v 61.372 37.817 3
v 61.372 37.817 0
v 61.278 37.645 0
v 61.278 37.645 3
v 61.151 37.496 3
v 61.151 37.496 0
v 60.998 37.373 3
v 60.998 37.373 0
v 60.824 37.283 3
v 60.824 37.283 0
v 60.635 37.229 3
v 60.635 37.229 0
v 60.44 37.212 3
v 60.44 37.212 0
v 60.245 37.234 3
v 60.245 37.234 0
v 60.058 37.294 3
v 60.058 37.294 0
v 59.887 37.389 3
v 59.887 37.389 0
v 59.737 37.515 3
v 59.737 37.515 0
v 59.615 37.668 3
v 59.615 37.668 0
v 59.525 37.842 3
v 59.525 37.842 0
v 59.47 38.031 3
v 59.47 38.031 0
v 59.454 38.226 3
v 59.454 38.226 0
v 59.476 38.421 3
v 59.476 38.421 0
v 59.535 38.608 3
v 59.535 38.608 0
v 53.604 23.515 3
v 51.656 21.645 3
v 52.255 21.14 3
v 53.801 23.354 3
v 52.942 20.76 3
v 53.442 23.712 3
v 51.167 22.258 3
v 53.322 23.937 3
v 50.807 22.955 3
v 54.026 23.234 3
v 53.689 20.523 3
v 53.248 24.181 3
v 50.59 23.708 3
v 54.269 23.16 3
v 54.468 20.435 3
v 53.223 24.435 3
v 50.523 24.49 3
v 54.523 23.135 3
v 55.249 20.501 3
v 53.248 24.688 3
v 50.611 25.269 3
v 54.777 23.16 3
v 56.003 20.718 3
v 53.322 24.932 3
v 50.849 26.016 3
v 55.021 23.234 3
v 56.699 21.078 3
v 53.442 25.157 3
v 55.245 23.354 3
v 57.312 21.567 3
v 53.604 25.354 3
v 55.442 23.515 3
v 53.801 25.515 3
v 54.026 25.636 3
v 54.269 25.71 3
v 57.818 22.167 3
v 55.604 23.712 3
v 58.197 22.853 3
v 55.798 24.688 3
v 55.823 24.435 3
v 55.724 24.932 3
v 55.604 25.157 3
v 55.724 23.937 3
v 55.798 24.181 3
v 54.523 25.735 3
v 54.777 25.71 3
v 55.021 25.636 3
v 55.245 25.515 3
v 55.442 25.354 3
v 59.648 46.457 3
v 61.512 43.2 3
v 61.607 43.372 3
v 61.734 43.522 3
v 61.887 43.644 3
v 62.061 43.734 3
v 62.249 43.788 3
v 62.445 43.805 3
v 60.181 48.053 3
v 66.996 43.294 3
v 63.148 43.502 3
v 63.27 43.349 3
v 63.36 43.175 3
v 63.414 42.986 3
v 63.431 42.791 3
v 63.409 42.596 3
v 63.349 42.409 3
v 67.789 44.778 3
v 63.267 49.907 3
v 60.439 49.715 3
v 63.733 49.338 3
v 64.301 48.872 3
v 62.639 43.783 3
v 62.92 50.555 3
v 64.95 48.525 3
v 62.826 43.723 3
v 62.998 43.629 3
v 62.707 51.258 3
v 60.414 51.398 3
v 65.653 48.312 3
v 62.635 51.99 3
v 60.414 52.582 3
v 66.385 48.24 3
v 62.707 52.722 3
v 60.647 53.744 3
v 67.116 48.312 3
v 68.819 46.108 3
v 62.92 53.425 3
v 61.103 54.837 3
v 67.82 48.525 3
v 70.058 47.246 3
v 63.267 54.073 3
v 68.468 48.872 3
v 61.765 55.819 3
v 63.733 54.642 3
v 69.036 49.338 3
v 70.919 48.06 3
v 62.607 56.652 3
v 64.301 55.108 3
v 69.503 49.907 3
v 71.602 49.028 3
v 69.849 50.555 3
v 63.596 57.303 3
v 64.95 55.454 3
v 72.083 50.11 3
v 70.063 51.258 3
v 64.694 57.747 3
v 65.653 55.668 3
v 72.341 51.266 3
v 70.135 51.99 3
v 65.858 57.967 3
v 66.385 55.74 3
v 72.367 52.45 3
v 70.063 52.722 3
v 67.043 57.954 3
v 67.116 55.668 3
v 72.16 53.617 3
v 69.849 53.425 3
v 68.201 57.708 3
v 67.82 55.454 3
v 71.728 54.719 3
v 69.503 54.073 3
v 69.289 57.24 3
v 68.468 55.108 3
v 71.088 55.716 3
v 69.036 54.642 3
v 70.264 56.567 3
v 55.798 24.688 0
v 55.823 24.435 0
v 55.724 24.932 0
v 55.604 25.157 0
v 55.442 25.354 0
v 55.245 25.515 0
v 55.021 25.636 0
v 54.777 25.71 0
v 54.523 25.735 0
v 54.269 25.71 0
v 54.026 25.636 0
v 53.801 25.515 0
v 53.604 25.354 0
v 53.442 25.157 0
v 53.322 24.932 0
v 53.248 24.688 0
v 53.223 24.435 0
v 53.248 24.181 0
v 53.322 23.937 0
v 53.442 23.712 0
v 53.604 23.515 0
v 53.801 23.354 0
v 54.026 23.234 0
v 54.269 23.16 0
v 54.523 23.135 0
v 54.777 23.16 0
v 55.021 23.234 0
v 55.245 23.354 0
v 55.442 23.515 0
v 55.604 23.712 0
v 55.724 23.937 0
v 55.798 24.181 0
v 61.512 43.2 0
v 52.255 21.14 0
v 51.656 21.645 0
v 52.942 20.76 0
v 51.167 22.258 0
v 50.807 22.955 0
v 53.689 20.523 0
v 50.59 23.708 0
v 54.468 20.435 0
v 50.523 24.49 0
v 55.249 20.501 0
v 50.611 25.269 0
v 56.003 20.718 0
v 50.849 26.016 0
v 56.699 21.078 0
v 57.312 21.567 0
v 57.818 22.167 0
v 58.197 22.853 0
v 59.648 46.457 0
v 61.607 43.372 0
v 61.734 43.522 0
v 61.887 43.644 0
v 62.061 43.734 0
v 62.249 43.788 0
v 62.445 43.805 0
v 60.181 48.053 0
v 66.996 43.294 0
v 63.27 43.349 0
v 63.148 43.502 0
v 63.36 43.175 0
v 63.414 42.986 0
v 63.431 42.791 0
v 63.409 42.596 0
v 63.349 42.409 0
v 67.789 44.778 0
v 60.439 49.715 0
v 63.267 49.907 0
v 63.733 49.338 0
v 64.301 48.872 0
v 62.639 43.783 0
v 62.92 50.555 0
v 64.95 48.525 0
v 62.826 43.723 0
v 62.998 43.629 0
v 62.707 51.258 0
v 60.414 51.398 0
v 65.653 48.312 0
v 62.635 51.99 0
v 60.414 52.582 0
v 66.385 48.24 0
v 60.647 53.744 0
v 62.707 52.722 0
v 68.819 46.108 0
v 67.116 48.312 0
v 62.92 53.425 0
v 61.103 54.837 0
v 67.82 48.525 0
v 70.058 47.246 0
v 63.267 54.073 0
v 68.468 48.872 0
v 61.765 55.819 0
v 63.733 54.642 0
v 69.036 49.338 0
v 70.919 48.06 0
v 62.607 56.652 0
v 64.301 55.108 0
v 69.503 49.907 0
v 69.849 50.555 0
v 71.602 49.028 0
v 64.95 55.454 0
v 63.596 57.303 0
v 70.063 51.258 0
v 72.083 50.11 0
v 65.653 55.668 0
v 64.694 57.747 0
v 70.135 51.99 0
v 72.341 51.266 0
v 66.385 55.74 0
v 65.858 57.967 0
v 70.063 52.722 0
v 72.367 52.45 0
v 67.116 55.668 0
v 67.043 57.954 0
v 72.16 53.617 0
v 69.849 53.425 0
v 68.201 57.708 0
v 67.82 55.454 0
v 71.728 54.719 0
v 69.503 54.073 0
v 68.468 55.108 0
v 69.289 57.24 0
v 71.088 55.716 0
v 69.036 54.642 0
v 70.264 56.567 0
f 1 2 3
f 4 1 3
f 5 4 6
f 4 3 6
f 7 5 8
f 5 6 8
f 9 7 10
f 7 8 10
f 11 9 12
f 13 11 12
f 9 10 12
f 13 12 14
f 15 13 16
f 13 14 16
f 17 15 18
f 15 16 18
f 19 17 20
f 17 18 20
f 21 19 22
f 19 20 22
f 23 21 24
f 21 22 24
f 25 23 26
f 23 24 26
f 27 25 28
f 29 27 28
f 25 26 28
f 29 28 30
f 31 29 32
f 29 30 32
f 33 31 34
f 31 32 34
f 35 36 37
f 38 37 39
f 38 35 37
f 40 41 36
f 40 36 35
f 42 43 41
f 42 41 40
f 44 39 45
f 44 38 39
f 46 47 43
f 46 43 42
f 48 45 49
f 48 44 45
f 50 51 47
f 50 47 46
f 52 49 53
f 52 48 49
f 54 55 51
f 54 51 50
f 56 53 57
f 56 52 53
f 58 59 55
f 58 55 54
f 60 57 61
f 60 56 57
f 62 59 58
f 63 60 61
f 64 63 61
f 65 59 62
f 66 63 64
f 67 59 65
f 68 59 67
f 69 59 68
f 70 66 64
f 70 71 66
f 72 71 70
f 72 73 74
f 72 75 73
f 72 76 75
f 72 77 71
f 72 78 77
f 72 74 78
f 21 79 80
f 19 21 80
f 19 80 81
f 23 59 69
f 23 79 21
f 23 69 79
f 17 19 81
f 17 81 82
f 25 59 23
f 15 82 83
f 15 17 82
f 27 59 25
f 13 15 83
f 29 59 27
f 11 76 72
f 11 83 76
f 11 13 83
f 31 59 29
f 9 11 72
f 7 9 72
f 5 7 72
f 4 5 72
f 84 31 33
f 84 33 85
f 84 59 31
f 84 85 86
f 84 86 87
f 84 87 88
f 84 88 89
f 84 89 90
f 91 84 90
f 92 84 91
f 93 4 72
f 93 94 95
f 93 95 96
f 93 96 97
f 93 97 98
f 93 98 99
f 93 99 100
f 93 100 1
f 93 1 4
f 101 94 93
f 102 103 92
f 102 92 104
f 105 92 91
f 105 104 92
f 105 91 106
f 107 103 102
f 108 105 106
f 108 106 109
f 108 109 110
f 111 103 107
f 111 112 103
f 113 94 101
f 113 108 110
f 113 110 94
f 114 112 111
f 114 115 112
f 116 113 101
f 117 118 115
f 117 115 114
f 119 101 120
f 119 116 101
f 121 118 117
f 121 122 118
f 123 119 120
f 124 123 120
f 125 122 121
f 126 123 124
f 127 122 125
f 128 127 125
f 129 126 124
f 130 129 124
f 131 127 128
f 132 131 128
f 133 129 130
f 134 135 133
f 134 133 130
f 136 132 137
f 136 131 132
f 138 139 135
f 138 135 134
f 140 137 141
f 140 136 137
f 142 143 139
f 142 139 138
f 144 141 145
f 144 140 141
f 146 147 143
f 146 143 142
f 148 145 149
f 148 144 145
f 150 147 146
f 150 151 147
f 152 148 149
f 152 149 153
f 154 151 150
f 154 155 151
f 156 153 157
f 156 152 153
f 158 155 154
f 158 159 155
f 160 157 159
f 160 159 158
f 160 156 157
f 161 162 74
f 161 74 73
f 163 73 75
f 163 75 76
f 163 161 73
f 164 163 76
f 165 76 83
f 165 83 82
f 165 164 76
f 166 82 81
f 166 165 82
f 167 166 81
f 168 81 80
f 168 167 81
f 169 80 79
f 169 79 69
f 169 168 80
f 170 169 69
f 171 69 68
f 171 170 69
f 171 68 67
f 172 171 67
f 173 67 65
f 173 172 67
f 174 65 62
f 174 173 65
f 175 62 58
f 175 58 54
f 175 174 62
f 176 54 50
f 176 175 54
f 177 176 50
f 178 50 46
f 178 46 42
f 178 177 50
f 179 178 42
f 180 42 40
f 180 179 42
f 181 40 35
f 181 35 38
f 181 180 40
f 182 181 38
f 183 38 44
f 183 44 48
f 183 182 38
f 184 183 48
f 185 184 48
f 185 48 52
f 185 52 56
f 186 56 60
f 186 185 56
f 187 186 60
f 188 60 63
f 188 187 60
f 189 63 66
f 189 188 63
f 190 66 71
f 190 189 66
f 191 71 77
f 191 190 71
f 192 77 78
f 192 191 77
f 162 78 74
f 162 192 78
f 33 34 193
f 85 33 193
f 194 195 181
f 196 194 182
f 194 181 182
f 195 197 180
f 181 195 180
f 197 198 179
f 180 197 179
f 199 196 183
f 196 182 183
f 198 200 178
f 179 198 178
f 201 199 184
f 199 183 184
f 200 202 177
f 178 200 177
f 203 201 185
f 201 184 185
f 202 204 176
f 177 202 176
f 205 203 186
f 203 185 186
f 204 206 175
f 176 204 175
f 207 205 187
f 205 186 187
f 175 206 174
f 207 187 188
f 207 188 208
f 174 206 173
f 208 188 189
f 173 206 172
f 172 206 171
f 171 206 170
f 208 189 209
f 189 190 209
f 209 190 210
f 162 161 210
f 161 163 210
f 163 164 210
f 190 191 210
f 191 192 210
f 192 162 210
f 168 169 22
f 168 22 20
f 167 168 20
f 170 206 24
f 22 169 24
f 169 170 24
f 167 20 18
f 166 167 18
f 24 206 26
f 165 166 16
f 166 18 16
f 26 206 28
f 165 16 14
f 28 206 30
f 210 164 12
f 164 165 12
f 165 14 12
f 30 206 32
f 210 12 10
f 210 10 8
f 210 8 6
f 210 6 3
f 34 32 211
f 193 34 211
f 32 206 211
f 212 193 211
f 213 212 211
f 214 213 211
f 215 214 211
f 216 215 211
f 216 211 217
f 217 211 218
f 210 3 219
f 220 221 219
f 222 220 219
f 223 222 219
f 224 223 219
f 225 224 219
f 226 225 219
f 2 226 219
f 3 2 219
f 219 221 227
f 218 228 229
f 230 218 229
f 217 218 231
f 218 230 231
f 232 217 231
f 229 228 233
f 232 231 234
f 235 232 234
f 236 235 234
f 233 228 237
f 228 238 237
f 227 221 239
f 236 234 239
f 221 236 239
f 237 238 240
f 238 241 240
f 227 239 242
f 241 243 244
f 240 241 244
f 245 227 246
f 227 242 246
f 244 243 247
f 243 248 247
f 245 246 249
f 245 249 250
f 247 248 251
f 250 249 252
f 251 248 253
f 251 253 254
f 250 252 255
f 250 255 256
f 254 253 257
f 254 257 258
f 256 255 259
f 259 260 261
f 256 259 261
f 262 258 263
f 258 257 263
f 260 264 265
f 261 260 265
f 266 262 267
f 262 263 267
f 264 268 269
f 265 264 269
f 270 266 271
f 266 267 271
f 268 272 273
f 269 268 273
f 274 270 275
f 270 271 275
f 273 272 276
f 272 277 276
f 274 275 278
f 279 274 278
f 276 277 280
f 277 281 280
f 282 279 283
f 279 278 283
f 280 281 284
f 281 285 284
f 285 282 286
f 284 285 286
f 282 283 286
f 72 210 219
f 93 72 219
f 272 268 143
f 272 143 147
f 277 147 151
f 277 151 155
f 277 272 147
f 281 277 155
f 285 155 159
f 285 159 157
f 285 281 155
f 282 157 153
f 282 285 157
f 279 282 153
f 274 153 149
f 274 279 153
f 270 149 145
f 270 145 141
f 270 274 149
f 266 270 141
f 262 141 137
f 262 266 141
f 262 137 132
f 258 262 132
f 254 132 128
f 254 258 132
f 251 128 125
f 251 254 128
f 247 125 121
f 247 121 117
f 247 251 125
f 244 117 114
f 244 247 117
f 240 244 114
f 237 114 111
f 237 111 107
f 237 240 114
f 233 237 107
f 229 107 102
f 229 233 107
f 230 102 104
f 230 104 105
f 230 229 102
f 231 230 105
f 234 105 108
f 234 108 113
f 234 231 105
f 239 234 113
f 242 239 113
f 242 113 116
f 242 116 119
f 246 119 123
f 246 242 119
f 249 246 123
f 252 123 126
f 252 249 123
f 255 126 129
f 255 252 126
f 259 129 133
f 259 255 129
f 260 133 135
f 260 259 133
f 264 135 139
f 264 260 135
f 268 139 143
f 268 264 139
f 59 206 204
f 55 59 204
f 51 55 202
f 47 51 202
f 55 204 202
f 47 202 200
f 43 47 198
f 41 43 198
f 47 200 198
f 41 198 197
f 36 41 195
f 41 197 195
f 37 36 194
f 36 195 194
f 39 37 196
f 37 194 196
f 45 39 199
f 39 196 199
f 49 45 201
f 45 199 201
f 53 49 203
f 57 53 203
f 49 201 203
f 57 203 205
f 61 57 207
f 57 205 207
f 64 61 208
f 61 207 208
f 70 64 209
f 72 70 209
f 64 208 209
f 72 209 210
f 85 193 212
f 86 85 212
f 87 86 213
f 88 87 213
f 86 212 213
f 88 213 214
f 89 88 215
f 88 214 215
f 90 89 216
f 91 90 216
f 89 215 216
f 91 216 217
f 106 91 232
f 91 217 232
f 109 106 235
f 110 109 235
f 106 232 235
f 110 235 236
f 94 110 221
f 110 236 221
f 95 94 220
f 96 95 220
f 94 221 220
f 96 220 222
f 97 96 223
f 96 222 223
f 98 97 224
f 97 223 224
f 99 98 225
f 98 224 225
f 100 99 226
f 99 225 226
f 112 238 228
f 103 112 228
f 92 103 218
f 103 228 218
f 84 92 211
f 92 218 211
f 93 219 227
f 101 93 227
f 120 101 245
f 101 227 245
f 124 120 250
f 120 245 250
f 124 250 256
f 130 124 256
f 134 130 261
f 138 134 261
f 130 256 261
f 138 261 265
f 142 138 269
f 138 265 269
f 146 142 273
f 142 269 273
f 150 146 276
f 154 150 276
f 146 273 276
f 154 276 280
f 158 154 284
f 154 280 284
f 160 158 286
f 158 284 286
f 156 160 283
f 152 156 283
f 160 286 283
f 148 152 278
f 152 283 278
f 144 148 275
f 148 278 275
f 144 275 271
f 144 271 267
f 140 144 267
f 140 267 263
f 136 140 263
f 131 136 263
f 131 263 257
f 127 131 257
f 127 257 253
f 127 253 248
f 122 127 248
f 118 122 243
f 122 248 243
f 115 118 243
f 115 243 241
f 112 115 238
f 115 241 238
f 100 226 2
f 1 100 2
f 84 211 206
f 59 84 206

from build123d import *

# Parameters (mm, degrees)
MODEL_R             = 1.3
MODEL_R_2           = 3.74995
BOSS_EXTRUDE1_DEPTH = 3


with BuildPart() as part:
    # Model → Boss-Extrude1 (new body)
    with BuildSketch(Plane.XY):
        with BuildLine():
            Line((59.647938224, 46.456741559), (50.84903604, 26.016099779))
            ThreePointArc((50.84903604, 26.016099779), (52.941556865, 20.760497372), (58.197159265, 22.8530182))
            Line((58.197159265, 22.8530182), (66.996061448, 43.293659979))
            ThreePointArc((66.996061448, 43.293659979), (68.276182261, 45.464386961), (70.05834452, 47.246145252))
            ThreePointArc((70.05834452, 47.246145252), (68.756948833, 57.501076502), (60.413932787, 51.397689825))
            ThreePointArc((60.413932787, 51.397689825), (60.344733109, 48.87856769), (59.647938224, 46.456741559))
        make_face()
        with Locations((54.523097656, 24.434558988)):
            Circle(MODEL_R, mode=Mode.SUBTRACT)
        with Locations((66.384679731, 51.989955386)):
            Circle(MODEL_R_2, mode=Mode.SUBTRACT)
        with BuildLine():
            Line((63.349317004, 42.409481853), (61.372391017, 37.816904838))
            ThreePointArc((61.372391017, 37.816904838), (60.058490416, 37.293774632), (59.535360211, 38.607675233))
            Line((59.535360211, 38.607675233), (61.512286198, 43.200252248))
            ThreePointArc((61.512286198, 43.200252248), (62.826186798, 43.723382454), (63.349317004, 42.409481853))
        make_face(mode=Mode.SUBTRACT)
    extrude(amount=BOSS_EXTRUDE1_DEPTH)


solid = part.part
